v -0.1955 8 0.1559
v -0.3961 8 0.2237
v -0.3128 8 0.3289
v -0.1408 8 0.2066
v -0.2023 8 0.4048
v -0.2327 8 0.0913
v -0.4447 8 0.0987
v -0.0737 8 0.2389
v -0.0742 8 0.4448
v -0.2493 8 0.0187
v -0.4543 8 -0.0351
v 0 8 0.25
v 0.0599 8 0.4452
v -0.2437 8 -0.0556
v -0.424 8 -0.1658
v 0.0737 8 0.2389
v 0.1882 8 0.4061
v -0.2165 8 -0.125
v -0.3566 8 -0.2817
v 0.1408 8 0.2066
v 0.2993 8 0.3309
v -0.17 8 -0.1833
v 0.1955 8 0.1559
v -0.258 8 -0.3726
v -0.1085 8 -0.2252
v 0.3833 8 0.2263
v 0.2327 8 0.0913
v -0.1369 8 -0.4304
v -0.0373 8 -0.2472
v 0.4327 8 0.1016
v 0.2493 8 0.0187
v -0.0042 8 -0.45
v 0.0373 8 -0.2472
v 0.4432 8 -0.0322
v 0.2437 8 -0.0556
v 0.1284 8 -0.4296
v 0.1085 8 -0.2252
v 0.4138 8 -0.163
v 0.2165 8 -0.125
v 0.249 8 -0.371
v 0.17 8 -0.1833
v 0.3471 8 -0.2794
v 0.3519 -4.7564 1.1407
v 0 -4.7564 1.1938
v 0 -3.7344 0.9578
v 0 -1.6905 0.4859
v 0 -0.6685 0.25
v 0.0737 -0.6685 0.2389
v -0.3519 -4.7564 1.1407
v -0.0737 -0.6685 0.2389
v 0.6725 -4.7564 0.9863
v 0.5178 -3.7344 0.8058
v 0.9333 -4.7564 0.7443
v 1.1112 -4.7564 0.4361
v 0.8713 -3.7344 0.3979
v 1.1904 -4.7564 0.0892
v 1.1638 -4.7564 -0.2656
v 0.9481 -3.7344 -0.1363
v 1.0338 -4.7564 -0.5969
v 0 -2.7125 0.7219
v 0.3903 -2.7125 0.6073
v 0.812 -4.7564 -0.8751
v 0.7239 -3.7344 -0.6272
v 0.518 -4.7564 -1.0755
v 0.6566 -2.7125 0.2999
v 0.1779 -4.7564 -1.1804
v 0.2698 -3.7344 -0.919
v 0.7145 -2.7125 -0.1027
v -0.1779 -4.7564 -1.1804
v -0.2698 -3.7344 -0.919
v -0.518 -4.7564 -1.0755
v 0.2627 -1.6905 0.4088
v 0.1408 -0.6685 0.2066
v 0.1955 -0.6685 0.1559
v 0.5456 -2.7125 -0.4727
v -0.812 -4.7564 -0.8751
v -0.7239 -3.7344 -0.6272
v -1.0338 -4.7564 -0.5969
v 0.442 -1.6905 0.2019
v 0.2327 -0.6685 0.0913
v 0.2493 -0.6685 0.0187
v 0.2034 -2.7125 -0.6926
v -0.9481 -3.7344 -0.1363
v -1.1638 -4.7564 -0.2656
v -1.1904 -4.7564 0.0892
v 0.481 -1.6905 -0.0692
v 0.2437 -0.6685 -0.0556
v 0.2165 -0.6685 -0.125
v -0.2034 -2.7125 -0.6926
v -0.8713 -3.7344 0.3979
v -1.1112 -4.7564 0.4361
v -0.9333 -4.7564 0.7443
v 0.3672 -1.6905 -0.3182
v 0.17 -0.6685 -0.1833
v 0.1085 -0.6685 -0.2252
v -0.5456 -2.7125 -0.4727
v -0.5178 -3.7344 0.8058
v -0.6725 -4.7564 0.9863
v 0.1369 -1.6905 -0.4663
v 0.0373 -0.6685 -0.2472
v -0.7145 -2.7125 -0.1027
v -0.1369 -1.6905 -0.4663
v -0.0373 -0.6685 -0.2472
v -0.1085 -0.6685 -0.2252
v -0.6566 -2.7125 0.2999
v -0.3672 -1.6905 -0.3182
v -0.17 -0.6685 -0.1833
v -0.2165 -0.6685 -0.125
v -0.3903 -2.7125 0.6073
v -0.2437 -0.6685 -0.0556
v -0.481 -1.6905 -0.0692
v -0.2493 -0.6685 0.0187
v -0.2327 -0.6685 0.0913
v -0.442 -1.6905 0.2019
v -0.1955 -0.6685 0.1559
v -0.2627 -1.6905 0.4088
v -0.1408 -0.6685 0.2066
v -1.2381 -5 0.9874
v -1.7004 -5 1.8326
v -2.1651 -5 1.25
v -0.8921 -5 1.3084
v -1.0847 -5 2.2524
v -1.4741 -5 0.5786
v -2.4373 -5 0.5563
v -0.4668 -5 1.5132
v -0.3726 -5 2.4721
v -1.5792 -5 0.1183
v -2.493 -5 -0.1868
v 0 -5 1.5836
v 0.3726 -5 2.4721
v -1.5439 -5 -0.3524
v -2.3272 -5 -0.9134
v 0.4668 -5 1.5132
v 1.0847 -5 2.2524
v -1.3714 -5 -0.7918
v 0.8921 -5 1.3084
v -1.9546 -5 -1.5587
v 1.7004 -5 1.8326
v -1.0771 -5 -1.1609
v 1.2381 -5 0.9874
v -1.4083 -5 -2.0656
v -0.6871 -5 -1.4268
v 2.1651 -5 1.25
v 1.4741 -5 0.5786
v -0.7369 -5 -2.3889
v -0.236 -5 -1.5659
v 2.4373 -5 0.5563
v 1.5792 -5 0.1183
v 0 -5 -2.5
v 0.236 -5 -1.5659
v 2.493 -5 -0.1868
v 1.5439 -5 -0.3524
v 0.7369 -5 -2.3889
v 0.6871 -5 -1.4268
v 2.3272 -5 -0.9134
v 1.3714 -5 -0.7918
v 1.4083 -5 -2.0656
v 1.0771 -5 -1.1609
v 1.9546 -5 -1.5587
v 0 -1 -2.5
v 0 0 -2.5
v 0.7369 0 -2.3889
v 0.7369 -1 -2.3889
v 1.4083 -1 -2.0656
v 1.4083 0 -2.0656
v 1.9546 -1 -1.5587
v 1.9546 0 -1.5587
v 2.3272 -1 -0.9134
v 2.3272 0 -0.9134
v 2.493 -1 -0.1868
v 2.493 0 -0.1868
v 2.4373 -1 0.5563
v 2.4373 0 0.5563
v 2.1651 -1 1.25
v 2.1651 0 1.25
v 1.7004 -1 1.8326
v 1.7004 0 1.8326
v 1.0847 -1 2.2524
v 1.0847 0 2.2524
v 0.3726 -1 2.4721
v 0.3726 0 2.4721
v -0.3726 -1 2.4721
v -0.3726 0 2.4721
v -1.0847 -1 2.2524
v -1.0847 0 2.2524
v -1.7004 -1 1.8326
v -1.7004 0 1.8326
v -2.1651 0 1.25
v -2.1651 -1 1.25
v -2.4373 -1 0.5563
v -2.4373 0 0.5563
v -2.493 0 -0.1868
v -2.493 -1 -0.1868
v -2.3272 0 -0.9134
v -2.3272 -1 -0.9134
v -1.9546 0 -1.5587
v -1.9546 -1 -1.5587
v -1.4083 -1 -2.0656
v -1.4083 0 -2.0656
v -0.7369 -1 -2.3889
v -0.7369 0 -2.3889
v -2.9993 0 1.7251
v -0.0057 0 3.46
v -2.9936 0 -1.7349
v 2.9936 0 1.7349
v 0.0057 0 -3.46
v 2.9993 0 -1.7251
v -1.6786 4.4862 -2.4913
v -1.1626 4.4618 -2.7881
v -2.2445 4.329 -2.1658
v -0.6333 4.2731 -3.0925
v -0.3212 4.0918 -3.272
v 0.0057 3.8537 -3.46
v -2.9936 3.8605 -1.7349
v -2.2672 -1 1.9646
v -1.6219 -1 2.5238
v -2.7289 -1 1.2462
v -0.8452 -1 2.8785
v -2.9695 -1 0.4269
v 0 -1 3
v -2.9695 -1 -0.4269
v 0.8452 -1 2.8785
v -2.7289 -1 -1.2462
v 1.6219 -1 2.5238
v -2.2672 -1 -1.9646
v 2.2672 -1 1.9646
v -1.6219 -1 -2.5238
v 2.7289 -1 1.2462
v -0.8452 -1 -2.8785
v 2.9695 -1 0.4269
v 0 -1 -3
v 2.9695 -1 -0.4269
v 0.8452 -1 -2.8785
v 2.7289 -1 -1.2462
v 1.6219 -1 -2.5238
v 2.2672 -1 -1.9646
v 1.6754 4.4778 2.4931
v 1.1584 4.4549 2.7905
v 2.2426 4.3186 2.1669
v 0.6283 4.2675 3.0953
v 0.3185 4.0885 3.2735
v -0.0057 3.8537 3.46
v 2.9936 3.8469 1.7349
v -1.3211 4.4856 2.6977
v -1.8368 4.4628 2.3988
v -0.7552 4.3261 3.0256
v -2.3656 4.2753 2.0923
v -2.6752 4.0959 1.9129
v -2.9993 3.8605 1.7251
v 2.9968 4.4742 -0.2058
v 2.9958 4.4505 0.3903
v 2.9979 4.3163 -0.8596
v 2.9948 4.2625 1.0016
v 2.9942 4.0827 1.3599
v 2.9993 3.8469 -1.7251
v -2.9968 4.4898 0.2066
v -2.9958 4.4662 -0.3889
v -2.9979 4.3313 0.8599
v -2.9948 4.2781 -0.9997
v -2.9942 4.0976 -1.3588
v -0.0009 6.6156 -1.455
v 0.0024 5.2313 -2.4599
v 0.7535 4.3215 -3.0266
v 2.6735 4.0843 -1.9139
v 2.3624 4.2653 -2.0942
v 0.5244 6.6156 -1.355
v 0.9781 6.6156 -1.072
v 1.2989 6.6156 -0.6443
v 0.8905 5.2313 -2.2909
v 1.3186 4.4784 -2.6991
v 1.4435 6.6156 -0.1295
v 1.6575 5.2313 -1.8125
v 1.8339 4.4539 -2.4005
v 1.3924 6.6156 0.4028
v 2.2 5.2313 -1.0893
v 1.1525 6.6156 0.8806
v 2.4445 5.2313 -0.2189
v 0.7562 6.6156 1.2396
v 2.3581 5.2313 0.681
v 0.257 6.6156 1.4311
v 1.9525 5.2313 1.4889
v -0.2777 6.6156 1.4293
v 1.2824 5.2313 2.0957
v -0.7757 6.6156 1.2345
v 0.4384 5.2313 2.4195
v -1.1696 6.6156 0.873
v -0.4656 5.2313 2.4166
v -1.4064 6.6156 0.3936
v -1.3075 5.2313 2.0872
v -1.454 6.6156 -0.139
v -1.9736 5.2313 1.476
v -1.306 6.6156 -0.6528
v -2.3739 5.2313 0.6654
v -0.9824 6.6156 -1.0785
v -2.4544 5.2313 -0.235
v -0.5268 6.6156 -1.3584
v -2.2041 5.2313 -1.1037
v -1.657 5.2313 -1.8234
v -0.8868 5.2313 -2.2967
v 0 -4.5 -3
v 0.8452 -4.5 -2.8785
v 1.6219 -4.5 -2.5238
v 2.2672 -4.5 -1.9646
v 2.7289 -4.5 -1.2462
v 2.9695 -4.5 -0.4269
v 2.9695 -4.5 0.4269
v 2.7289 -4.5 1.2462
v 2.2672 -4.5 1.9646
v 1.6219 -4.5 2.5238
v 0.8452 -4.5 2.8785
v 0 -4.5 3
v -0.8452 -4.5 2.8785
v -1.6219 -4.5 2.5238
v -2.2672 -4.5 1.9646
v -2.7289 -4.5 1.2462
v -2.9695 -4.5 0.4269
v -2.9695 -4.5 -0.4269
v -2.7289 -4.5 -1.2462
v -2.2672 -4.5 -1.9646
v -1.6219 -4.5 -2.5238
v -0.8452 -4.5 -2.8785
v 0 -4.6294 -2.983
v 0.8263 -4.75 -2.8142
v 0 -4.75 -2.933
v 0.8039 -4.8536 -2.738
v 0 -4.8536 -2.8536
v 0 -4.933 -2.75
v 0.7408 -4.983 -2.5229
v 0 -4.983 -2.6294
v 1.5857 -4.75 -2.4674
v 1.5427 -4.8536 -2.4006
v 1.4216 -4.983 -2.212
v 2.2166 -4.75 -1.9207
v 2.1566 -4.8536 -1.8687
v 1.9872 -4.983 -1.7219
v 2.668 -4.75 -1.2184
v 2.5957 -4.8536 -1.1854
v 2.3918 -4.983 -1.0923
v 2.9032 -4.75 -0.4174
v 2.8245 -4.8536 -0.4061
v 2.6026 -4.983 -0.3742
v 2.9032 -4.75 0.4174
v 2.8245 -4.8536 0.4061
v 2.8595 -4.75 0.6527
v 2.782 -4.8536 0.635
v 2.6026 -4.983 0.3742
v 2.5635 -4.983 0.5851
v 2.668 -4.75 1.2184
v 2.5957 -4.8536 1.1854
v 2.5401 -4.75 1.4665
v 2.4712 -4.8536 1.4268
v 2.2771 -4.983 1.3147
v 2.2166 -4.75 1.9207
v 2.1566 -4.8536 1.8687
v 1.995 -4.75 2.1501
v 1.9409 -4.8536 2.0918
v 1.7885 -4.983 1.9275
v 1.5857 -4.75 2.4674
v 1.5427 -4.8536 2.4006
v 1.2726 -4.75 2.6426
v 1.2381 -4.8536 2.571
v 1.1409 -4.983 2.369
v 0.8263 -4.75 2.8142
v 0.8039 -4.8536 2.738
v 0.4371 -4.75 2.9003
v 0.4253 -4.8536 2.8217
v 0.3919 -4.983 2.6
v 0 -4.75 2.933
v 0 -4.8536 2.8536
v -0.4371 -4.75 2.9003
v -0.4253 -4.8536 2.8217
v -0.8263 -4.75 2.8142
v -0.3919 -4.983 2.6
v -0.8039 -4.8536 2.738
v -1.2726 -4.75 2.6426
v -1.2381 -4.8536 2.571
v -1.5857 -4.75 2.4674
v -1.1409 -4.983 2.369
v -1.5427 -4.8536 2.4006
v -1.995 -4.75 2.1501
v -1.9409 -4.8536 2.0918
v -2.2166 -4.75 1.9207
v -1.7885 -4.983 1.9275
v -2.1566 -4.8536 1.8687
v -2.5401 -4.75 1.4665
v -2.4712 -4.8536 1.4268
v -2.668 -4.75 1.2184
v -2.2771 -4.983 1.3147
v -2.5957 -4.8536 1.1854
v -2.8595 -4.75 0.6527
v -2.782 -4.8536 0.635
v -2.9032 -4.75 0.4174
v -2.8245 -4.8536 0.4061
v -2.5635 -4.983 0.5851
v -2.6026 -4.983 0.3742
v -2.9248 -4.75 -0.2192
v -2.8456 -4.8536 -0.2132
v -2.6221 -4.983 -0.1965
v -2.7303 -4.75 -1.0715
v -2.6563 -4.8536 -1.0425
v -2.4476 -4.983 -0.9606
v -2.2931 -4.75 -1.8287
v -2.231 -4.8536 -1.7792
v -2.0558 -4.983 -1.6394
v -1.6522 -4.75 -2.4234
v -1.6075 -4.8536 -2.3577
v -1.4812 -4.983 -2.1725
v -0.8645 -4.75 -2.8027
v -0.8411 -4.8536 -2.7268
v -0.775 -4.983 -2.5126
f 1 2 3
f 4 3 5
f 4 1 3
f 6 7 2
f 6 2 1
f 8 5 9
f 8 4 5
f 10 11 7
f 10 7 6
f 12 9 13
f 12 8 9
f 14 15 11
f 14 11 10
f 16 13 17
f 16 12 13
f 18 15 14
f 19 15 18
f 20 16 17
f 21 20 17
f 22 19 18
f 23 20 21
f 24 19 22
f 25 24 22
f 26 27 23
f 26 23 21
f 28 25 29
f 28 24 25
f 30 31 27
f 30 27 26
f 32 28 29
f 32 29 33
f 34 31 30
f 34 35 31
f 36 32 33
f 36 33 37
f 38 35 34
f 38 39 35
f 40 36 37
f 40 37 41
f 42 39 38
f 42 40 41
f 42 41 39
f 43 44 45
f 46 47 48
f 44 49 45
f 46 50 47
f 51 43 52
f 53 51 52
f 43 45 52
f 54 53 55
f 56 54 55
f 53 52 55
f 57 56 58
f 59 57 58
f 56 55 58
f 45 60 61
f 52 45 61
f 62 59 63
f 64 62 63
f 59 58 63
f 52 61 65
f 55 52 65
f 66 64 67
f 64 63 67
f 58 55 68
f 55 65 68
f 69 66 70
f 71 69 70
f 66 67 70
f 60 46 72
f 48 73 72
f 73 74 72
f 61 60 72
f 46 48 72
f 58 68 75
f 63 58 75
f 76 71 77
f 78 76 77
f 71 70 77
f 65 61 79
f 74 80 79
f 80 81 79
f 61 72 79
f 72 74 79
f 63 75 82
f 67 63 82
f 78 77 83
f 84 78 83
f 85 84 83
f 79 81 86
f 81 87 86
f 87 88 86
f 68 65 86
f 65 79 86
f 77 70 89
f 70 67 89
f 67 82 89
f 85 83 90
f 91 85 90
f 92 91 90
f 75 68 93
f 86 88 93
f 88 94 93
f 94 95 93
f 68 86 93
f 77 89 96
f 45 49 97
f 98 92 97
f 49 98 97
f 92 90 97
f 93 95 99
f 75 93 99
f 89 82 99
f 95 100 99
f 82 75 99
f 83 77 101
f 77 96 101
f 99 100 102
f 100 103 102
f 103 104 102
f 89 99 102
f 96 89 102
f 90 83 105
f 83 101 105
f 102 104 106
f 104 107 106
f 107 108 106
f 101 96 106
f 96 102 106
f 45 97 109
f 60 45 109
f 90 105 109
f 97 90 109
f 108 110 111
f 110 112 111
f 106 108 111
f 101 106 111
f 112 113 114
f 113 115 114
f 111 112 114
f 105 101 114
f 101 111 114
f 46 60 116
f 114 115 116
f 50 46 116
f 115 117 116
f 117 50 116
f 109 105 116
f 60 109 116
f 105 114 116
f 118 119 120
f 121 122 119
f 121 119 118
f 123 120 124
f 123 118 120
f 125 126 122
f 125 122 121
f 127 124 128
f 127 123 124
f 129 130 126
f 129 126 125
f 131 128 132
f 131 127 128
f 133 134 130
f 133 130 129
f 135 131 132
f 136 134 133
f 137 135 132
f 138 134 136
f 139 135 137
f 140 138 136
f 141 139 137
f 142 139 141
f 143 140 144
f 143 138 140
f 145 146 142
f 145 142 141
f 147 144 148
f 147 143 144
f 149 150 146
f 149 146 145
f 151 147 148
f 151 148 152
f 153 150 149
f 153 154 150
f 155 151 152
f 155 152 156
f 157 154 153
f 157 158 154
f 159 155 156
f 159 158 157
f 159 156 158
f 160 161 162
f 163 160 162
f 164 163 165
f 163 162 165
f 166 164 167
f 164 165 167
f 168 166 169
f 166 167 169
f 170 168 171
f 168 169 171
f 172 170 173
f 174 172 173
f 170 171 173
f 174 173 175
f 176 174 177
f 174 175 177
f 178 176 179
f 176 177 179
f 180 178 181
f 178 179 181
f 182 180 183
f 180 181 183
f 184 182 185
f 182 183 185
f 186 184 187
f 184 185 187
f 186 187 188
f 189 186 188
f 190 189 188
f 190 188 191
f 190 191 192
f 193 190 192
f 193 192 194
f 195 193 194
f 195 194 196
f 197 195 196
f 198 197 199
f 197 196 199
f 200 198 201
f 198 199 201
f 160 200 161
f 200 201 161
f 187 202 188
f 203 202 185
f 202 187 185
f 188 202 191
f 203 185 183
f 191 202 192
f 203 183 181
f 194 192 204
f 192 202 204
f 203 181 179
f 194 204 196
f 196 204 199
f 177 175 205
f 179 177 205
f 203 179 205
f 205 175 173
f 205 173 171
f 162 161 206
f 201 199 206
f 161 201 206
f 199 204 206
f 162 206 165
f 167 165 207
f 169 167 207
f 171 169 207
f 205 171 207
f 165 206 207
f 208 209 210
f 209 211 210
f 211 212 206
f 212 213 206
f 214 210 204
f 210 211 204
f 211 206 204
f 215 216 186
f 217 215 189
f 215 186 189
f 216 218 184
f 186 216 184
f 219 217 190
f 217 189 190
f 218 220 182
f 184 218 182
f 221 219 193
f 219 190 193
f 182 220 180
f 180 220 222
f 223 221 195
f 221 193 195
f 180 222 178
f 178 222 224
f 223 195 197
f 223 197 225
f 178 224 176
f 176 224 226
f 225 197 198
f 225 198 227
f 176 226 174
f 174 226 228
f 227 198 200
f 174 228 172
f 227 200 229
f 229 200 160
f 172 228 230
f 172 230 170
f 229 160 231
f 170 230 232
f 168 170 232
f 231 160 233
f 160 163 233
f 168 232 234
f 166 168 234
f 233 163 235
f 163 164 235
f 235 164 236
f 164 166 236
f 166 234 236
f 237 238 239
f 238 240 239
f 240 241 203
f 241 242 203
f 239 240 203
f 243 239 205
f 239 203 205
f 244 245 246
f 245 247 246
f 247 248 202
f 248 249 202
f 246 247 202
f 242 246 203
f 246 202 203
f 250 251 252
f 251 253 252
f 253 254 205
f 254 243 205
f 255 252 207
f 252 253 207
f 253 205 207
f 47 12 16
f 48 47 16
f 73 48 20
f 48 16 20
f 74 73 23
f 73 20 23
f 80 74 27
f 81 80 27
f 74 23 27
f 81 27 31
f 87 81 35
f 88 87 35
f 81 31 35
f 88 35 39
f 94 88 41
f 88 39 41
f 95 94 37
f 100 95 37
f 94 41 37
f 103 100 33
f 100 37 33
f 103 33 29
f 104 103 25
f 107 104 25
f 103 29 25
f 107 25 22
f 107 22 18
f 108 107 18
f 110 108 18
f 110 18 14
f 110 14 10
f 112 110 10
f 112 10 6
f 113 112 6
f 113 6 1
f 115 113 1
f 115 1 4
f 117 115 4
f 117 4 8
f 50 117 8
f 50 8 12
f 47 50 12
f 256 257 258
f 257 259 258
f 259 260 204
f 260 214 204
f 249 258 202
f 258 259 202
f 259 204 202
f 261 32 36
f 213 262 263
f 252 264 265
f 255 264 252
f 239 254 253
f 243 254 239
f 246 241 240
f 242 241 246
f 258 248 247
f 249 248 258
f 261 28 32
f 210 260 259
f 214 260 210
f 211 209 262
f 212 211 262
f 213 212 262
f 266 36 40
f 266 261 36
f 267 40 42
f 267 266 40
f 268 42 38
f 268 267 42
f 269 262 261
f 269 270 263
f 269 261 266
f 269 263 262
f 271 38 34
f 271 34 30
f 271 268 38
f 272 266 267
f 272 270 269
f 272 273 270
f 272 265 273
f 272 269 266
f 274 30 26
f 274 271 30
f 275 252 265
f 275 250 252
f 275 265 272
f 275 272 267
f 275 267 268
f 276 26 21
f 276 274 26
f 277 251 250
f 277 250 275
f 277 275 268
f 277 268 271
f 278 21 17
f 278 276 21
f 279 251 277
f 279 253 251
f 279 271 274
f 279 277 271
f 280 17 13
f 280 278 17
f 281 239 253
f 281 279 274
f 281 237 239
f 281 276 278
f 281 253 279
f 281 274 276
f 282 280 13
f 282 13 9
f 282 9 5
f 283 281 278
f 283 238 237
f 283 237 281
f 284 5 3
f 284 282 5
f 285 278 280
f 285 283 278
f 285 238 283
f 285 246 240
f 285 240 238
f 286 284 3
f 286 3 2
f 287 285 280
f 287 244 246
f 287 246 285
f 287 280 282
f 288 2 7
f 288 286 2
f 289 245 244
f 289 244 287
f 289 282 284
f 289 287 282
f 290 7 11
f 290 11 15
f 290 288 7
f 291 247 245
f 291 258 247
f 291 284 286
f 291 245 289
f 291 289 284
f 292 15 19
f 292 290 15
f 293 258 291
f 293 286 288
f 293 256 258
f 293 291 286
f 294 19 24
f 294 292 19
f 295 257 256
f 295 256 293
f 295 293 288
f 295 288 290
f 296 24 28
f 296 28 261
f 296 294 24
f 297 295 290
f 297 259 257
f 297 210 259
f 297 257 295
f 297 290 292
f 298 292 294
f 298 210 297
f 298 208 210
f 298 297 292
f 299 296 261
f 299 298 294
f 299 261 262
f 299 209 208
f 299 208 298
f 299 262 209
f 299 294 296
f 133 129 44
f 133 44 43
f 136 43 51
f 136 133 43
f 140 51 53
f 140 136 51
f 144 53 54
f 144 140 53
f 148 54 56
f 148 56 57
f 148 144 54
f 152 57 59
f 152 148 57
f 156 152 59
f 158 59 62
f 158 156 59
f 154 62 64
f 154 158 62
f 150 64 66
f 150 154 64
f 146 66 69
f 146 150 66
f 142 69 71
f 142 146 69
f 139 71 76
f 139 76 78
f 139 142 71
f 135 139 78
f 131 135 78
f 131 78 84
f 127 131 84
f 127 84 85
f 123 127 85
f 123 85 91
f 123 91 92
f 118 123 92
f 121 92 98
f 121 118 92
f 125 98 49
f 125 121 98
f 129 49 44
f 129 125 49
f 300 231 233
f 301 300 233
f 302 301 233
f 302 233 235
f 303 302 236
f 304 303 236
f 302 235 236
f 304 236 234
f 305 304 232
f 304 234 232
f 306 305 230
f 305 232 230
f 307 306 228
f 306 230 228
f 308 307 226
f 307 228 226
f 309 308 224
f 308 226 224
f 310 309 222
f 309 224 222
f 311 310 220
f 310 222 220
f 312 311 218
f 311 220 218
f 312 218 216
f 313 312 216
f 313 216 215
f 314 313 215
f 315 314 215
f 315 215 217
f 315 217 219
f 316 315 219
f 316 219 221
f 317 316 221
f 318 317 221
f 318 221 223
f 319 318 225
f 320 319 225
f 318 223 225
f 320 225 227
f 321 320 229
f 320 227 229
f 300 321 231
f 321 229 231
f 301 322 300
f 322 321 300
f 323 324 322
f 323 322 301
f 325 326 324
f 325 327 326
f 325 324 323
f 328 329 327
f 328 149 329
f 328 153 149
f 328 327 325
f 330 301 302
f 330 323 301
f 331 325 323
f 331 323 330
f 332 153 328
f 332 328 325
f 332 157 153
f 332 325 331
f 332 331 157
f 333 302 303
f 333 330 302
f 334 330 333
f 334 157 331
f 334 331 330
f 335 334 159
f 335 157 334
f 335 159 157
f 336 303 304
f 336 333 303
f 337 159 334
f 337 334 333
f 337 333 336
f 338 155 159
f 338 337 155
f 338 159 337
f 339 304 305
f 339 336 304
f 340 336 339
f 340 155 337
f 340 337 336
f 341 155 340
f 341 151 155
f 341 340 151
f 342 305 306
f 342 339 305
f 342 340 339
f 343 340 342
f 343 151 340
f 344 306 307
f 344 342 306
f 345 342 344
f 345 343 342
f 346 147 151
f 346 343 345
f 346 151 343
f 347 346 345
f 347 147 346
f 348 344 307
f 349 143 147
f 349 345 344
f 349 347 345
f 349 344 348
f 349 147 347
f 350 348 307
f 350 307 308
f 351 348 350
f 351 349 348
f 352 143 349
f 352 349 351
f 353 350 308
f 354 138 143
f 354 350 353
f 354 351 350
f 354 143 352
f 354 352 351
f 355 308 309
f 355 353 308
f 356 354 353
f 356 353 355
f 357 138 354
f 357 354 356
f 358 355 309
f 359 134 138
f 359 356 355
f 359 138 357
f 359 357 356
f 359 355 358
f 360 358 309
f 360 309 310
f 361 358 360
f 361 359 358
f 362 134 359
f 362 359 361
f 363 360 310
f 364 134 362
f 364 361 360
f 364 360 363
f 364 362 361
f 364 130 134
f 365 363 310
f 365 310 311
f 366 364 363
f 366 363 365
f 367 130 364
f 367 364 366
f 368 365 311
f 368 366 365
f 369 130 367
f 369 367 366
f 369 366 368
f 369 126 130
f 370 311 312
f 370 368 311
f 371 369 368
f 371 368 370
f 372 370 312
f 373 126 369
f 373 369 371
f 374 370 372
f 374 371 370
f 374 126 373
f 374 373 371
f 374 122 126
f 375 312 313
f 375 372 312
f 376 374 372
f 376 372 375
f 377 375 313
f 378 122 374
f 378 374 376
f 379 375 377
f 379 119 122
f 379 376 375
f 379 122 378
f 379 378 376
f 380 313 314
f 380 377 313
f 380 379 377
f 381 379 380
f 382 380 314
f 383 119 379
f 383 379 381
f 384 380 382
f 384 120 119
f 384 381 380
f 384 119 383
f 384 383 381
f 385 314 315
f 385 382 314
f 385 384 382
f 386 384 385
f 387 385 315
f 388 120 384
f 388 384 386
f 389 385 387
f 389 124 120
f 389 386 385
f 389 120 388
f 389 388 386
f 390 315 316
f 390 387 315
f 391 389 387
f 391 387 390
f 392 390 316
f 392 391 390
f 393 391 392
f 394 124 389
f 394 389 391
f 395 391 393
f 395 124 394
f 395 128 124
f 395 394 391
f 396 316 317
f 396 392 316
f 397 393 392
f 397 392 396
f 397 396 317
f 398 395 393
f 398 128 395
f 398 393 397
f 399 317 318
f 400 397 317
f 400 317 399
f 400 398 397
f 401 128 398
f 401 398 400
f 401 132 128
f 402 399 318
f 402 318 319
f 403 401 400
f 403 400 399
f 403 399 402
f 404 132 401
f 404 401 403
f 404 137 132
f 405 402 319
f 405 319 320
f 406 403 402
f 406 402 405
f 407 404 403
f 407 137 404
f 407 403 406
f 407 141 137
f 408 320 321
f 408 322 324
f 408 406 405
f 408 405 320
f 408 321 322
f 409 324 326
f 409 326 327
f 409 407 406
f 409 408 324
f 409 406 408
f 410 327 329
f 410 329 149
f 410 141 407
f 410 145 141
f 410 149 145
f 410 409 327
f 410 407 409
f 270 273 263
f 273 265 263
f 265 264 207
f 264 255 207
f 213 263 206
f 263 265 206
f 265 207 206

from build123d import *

# Parameters (mm, degrees)
BOSS_EXTRUDE1_DEPTH = 8
SKETCH3_R           = 2.5
BOSS_EXTRUDE2_DEPTH = 1
SKETCH4_R           = 3
BOSS_EXTRUDE3_DEPTH = 4
FILLET1_R           = 0.5
SKETCH5_R           = 0.25
CUT_EXTRUDE1_DEPTH  = 100
CHAMFER1_SIZE       = 1
CHAMFER1_SIZE2      = 4.331475874
CHAMFER2_SIZE       = 0.25
CHAMFER2_SIZE2      = 0.333591751


with BuildPart() as part:
    # Sketch1 → Boss-Extrude1 (new body)
    with BuildSketch(Plane(origin=(0, 0, 0), x_dir=(1, 0, 0), z_dir=(0, 1, 0))):
        Polygon((-2.999284009, -1.725078384), (-0.0056803, -3.459995337), (2.993603709, -1.734916953), (2.999284009, 1.725078384), (0.0056803, 3.459995337), (-2.993603709, 1.734916953), align=None)
    extrude(amount=BOSS_EXTRUDE1_DEPTH)

    # Sketch2 → Cut-Revolve2 (revolve, cut)
    with BuildSketch(Plane.XY, mode=Mode.PRIVATE) as cut_revolve2_sk:
        Polygon((-0.4556803, 8), (-4.194310439, 2.85), (-4.194310439, 8), align=None)
    revolve(cut_revolve2_sk.sketch.rotate(Axis((-0.0056803, 8, 0), (0, -1, 0)), 90.188125981), axis=Axis((-0.0056803, 8, 0), (0, -1, 0)), mode=Mode.SUBTRACT)

    # Sketch3 → Boss-Extrude2 (add)
    with BuildSketch(Plane.XZ):
        with Locations(Location((0, 0, 0), (0, 0, 270))):
            Circle(SKETCH3_R)
    extrude(amount=BOSS_EXTRUDE2_DEPTH)

    # Sketch4 → Boss-Extrude3 (add)
    with BuildSketch(Plane.XZ.offset(1)):
        with Locations(Location((0, 0, 0), (0, 0, 270))):
            Circle(SKETCH4_R)
    extrude(amount=BOSS_EXTRUDE3_DEPTH)

    # Fillet1
    fillet1_edges = [part.edges().sort_by_distance(p)[0] for p in [
        (0, -5, 3),
    ]]
    fillet(fillet1_edges, radius=FILLET1_R)

    # Sketch5 → Cut-Extrude1 (cut)
    with BuildSketch(Plane(origin=(0, 8, 0), x_dir=(1, 0, 0), z_dir=(0, 1, 0))):
        with Locations(Location((0, 0, 0), (0, 0, 270))):
            Circle(SKETCH5_R)
    extrude(amount=-CUT_EXTRUDE1_DEPTH, mode=Mode.SUBTRACT)

    # Chamfer1
    chamfer1_edges = [part.edges().sort_by_distance(p)[0] for p in [
        (0, -5, -0.25),
    ]]
    chamfer1_side = [part.faces().sort_by_distance(p)[0] for p in [
        (0, -5, 2.429289322),
    ]]
    chamfer(chamfer1_edges, length=CHAMFER1_SIZE, length2=CHAMFER1_SIZE2, reference=chamfer1_side[0])

    # Chamfer2
    chamfer2_edges = [part.edges().sort_by_distance(p)[0] for p in [
        (0, -5, -1.25),
    ]]
    chamfer2_side = [part.faces().sort_by_distance(p)[0] for p in [
        (0, -2.834262063, -0.75),
    ]]
    chamfer(chamfer2_edges, length=CHAMFER2_SIZE, length2=CHAMFER2_SIZE2, reference=chamfer2_side[0])


solid = part.part
